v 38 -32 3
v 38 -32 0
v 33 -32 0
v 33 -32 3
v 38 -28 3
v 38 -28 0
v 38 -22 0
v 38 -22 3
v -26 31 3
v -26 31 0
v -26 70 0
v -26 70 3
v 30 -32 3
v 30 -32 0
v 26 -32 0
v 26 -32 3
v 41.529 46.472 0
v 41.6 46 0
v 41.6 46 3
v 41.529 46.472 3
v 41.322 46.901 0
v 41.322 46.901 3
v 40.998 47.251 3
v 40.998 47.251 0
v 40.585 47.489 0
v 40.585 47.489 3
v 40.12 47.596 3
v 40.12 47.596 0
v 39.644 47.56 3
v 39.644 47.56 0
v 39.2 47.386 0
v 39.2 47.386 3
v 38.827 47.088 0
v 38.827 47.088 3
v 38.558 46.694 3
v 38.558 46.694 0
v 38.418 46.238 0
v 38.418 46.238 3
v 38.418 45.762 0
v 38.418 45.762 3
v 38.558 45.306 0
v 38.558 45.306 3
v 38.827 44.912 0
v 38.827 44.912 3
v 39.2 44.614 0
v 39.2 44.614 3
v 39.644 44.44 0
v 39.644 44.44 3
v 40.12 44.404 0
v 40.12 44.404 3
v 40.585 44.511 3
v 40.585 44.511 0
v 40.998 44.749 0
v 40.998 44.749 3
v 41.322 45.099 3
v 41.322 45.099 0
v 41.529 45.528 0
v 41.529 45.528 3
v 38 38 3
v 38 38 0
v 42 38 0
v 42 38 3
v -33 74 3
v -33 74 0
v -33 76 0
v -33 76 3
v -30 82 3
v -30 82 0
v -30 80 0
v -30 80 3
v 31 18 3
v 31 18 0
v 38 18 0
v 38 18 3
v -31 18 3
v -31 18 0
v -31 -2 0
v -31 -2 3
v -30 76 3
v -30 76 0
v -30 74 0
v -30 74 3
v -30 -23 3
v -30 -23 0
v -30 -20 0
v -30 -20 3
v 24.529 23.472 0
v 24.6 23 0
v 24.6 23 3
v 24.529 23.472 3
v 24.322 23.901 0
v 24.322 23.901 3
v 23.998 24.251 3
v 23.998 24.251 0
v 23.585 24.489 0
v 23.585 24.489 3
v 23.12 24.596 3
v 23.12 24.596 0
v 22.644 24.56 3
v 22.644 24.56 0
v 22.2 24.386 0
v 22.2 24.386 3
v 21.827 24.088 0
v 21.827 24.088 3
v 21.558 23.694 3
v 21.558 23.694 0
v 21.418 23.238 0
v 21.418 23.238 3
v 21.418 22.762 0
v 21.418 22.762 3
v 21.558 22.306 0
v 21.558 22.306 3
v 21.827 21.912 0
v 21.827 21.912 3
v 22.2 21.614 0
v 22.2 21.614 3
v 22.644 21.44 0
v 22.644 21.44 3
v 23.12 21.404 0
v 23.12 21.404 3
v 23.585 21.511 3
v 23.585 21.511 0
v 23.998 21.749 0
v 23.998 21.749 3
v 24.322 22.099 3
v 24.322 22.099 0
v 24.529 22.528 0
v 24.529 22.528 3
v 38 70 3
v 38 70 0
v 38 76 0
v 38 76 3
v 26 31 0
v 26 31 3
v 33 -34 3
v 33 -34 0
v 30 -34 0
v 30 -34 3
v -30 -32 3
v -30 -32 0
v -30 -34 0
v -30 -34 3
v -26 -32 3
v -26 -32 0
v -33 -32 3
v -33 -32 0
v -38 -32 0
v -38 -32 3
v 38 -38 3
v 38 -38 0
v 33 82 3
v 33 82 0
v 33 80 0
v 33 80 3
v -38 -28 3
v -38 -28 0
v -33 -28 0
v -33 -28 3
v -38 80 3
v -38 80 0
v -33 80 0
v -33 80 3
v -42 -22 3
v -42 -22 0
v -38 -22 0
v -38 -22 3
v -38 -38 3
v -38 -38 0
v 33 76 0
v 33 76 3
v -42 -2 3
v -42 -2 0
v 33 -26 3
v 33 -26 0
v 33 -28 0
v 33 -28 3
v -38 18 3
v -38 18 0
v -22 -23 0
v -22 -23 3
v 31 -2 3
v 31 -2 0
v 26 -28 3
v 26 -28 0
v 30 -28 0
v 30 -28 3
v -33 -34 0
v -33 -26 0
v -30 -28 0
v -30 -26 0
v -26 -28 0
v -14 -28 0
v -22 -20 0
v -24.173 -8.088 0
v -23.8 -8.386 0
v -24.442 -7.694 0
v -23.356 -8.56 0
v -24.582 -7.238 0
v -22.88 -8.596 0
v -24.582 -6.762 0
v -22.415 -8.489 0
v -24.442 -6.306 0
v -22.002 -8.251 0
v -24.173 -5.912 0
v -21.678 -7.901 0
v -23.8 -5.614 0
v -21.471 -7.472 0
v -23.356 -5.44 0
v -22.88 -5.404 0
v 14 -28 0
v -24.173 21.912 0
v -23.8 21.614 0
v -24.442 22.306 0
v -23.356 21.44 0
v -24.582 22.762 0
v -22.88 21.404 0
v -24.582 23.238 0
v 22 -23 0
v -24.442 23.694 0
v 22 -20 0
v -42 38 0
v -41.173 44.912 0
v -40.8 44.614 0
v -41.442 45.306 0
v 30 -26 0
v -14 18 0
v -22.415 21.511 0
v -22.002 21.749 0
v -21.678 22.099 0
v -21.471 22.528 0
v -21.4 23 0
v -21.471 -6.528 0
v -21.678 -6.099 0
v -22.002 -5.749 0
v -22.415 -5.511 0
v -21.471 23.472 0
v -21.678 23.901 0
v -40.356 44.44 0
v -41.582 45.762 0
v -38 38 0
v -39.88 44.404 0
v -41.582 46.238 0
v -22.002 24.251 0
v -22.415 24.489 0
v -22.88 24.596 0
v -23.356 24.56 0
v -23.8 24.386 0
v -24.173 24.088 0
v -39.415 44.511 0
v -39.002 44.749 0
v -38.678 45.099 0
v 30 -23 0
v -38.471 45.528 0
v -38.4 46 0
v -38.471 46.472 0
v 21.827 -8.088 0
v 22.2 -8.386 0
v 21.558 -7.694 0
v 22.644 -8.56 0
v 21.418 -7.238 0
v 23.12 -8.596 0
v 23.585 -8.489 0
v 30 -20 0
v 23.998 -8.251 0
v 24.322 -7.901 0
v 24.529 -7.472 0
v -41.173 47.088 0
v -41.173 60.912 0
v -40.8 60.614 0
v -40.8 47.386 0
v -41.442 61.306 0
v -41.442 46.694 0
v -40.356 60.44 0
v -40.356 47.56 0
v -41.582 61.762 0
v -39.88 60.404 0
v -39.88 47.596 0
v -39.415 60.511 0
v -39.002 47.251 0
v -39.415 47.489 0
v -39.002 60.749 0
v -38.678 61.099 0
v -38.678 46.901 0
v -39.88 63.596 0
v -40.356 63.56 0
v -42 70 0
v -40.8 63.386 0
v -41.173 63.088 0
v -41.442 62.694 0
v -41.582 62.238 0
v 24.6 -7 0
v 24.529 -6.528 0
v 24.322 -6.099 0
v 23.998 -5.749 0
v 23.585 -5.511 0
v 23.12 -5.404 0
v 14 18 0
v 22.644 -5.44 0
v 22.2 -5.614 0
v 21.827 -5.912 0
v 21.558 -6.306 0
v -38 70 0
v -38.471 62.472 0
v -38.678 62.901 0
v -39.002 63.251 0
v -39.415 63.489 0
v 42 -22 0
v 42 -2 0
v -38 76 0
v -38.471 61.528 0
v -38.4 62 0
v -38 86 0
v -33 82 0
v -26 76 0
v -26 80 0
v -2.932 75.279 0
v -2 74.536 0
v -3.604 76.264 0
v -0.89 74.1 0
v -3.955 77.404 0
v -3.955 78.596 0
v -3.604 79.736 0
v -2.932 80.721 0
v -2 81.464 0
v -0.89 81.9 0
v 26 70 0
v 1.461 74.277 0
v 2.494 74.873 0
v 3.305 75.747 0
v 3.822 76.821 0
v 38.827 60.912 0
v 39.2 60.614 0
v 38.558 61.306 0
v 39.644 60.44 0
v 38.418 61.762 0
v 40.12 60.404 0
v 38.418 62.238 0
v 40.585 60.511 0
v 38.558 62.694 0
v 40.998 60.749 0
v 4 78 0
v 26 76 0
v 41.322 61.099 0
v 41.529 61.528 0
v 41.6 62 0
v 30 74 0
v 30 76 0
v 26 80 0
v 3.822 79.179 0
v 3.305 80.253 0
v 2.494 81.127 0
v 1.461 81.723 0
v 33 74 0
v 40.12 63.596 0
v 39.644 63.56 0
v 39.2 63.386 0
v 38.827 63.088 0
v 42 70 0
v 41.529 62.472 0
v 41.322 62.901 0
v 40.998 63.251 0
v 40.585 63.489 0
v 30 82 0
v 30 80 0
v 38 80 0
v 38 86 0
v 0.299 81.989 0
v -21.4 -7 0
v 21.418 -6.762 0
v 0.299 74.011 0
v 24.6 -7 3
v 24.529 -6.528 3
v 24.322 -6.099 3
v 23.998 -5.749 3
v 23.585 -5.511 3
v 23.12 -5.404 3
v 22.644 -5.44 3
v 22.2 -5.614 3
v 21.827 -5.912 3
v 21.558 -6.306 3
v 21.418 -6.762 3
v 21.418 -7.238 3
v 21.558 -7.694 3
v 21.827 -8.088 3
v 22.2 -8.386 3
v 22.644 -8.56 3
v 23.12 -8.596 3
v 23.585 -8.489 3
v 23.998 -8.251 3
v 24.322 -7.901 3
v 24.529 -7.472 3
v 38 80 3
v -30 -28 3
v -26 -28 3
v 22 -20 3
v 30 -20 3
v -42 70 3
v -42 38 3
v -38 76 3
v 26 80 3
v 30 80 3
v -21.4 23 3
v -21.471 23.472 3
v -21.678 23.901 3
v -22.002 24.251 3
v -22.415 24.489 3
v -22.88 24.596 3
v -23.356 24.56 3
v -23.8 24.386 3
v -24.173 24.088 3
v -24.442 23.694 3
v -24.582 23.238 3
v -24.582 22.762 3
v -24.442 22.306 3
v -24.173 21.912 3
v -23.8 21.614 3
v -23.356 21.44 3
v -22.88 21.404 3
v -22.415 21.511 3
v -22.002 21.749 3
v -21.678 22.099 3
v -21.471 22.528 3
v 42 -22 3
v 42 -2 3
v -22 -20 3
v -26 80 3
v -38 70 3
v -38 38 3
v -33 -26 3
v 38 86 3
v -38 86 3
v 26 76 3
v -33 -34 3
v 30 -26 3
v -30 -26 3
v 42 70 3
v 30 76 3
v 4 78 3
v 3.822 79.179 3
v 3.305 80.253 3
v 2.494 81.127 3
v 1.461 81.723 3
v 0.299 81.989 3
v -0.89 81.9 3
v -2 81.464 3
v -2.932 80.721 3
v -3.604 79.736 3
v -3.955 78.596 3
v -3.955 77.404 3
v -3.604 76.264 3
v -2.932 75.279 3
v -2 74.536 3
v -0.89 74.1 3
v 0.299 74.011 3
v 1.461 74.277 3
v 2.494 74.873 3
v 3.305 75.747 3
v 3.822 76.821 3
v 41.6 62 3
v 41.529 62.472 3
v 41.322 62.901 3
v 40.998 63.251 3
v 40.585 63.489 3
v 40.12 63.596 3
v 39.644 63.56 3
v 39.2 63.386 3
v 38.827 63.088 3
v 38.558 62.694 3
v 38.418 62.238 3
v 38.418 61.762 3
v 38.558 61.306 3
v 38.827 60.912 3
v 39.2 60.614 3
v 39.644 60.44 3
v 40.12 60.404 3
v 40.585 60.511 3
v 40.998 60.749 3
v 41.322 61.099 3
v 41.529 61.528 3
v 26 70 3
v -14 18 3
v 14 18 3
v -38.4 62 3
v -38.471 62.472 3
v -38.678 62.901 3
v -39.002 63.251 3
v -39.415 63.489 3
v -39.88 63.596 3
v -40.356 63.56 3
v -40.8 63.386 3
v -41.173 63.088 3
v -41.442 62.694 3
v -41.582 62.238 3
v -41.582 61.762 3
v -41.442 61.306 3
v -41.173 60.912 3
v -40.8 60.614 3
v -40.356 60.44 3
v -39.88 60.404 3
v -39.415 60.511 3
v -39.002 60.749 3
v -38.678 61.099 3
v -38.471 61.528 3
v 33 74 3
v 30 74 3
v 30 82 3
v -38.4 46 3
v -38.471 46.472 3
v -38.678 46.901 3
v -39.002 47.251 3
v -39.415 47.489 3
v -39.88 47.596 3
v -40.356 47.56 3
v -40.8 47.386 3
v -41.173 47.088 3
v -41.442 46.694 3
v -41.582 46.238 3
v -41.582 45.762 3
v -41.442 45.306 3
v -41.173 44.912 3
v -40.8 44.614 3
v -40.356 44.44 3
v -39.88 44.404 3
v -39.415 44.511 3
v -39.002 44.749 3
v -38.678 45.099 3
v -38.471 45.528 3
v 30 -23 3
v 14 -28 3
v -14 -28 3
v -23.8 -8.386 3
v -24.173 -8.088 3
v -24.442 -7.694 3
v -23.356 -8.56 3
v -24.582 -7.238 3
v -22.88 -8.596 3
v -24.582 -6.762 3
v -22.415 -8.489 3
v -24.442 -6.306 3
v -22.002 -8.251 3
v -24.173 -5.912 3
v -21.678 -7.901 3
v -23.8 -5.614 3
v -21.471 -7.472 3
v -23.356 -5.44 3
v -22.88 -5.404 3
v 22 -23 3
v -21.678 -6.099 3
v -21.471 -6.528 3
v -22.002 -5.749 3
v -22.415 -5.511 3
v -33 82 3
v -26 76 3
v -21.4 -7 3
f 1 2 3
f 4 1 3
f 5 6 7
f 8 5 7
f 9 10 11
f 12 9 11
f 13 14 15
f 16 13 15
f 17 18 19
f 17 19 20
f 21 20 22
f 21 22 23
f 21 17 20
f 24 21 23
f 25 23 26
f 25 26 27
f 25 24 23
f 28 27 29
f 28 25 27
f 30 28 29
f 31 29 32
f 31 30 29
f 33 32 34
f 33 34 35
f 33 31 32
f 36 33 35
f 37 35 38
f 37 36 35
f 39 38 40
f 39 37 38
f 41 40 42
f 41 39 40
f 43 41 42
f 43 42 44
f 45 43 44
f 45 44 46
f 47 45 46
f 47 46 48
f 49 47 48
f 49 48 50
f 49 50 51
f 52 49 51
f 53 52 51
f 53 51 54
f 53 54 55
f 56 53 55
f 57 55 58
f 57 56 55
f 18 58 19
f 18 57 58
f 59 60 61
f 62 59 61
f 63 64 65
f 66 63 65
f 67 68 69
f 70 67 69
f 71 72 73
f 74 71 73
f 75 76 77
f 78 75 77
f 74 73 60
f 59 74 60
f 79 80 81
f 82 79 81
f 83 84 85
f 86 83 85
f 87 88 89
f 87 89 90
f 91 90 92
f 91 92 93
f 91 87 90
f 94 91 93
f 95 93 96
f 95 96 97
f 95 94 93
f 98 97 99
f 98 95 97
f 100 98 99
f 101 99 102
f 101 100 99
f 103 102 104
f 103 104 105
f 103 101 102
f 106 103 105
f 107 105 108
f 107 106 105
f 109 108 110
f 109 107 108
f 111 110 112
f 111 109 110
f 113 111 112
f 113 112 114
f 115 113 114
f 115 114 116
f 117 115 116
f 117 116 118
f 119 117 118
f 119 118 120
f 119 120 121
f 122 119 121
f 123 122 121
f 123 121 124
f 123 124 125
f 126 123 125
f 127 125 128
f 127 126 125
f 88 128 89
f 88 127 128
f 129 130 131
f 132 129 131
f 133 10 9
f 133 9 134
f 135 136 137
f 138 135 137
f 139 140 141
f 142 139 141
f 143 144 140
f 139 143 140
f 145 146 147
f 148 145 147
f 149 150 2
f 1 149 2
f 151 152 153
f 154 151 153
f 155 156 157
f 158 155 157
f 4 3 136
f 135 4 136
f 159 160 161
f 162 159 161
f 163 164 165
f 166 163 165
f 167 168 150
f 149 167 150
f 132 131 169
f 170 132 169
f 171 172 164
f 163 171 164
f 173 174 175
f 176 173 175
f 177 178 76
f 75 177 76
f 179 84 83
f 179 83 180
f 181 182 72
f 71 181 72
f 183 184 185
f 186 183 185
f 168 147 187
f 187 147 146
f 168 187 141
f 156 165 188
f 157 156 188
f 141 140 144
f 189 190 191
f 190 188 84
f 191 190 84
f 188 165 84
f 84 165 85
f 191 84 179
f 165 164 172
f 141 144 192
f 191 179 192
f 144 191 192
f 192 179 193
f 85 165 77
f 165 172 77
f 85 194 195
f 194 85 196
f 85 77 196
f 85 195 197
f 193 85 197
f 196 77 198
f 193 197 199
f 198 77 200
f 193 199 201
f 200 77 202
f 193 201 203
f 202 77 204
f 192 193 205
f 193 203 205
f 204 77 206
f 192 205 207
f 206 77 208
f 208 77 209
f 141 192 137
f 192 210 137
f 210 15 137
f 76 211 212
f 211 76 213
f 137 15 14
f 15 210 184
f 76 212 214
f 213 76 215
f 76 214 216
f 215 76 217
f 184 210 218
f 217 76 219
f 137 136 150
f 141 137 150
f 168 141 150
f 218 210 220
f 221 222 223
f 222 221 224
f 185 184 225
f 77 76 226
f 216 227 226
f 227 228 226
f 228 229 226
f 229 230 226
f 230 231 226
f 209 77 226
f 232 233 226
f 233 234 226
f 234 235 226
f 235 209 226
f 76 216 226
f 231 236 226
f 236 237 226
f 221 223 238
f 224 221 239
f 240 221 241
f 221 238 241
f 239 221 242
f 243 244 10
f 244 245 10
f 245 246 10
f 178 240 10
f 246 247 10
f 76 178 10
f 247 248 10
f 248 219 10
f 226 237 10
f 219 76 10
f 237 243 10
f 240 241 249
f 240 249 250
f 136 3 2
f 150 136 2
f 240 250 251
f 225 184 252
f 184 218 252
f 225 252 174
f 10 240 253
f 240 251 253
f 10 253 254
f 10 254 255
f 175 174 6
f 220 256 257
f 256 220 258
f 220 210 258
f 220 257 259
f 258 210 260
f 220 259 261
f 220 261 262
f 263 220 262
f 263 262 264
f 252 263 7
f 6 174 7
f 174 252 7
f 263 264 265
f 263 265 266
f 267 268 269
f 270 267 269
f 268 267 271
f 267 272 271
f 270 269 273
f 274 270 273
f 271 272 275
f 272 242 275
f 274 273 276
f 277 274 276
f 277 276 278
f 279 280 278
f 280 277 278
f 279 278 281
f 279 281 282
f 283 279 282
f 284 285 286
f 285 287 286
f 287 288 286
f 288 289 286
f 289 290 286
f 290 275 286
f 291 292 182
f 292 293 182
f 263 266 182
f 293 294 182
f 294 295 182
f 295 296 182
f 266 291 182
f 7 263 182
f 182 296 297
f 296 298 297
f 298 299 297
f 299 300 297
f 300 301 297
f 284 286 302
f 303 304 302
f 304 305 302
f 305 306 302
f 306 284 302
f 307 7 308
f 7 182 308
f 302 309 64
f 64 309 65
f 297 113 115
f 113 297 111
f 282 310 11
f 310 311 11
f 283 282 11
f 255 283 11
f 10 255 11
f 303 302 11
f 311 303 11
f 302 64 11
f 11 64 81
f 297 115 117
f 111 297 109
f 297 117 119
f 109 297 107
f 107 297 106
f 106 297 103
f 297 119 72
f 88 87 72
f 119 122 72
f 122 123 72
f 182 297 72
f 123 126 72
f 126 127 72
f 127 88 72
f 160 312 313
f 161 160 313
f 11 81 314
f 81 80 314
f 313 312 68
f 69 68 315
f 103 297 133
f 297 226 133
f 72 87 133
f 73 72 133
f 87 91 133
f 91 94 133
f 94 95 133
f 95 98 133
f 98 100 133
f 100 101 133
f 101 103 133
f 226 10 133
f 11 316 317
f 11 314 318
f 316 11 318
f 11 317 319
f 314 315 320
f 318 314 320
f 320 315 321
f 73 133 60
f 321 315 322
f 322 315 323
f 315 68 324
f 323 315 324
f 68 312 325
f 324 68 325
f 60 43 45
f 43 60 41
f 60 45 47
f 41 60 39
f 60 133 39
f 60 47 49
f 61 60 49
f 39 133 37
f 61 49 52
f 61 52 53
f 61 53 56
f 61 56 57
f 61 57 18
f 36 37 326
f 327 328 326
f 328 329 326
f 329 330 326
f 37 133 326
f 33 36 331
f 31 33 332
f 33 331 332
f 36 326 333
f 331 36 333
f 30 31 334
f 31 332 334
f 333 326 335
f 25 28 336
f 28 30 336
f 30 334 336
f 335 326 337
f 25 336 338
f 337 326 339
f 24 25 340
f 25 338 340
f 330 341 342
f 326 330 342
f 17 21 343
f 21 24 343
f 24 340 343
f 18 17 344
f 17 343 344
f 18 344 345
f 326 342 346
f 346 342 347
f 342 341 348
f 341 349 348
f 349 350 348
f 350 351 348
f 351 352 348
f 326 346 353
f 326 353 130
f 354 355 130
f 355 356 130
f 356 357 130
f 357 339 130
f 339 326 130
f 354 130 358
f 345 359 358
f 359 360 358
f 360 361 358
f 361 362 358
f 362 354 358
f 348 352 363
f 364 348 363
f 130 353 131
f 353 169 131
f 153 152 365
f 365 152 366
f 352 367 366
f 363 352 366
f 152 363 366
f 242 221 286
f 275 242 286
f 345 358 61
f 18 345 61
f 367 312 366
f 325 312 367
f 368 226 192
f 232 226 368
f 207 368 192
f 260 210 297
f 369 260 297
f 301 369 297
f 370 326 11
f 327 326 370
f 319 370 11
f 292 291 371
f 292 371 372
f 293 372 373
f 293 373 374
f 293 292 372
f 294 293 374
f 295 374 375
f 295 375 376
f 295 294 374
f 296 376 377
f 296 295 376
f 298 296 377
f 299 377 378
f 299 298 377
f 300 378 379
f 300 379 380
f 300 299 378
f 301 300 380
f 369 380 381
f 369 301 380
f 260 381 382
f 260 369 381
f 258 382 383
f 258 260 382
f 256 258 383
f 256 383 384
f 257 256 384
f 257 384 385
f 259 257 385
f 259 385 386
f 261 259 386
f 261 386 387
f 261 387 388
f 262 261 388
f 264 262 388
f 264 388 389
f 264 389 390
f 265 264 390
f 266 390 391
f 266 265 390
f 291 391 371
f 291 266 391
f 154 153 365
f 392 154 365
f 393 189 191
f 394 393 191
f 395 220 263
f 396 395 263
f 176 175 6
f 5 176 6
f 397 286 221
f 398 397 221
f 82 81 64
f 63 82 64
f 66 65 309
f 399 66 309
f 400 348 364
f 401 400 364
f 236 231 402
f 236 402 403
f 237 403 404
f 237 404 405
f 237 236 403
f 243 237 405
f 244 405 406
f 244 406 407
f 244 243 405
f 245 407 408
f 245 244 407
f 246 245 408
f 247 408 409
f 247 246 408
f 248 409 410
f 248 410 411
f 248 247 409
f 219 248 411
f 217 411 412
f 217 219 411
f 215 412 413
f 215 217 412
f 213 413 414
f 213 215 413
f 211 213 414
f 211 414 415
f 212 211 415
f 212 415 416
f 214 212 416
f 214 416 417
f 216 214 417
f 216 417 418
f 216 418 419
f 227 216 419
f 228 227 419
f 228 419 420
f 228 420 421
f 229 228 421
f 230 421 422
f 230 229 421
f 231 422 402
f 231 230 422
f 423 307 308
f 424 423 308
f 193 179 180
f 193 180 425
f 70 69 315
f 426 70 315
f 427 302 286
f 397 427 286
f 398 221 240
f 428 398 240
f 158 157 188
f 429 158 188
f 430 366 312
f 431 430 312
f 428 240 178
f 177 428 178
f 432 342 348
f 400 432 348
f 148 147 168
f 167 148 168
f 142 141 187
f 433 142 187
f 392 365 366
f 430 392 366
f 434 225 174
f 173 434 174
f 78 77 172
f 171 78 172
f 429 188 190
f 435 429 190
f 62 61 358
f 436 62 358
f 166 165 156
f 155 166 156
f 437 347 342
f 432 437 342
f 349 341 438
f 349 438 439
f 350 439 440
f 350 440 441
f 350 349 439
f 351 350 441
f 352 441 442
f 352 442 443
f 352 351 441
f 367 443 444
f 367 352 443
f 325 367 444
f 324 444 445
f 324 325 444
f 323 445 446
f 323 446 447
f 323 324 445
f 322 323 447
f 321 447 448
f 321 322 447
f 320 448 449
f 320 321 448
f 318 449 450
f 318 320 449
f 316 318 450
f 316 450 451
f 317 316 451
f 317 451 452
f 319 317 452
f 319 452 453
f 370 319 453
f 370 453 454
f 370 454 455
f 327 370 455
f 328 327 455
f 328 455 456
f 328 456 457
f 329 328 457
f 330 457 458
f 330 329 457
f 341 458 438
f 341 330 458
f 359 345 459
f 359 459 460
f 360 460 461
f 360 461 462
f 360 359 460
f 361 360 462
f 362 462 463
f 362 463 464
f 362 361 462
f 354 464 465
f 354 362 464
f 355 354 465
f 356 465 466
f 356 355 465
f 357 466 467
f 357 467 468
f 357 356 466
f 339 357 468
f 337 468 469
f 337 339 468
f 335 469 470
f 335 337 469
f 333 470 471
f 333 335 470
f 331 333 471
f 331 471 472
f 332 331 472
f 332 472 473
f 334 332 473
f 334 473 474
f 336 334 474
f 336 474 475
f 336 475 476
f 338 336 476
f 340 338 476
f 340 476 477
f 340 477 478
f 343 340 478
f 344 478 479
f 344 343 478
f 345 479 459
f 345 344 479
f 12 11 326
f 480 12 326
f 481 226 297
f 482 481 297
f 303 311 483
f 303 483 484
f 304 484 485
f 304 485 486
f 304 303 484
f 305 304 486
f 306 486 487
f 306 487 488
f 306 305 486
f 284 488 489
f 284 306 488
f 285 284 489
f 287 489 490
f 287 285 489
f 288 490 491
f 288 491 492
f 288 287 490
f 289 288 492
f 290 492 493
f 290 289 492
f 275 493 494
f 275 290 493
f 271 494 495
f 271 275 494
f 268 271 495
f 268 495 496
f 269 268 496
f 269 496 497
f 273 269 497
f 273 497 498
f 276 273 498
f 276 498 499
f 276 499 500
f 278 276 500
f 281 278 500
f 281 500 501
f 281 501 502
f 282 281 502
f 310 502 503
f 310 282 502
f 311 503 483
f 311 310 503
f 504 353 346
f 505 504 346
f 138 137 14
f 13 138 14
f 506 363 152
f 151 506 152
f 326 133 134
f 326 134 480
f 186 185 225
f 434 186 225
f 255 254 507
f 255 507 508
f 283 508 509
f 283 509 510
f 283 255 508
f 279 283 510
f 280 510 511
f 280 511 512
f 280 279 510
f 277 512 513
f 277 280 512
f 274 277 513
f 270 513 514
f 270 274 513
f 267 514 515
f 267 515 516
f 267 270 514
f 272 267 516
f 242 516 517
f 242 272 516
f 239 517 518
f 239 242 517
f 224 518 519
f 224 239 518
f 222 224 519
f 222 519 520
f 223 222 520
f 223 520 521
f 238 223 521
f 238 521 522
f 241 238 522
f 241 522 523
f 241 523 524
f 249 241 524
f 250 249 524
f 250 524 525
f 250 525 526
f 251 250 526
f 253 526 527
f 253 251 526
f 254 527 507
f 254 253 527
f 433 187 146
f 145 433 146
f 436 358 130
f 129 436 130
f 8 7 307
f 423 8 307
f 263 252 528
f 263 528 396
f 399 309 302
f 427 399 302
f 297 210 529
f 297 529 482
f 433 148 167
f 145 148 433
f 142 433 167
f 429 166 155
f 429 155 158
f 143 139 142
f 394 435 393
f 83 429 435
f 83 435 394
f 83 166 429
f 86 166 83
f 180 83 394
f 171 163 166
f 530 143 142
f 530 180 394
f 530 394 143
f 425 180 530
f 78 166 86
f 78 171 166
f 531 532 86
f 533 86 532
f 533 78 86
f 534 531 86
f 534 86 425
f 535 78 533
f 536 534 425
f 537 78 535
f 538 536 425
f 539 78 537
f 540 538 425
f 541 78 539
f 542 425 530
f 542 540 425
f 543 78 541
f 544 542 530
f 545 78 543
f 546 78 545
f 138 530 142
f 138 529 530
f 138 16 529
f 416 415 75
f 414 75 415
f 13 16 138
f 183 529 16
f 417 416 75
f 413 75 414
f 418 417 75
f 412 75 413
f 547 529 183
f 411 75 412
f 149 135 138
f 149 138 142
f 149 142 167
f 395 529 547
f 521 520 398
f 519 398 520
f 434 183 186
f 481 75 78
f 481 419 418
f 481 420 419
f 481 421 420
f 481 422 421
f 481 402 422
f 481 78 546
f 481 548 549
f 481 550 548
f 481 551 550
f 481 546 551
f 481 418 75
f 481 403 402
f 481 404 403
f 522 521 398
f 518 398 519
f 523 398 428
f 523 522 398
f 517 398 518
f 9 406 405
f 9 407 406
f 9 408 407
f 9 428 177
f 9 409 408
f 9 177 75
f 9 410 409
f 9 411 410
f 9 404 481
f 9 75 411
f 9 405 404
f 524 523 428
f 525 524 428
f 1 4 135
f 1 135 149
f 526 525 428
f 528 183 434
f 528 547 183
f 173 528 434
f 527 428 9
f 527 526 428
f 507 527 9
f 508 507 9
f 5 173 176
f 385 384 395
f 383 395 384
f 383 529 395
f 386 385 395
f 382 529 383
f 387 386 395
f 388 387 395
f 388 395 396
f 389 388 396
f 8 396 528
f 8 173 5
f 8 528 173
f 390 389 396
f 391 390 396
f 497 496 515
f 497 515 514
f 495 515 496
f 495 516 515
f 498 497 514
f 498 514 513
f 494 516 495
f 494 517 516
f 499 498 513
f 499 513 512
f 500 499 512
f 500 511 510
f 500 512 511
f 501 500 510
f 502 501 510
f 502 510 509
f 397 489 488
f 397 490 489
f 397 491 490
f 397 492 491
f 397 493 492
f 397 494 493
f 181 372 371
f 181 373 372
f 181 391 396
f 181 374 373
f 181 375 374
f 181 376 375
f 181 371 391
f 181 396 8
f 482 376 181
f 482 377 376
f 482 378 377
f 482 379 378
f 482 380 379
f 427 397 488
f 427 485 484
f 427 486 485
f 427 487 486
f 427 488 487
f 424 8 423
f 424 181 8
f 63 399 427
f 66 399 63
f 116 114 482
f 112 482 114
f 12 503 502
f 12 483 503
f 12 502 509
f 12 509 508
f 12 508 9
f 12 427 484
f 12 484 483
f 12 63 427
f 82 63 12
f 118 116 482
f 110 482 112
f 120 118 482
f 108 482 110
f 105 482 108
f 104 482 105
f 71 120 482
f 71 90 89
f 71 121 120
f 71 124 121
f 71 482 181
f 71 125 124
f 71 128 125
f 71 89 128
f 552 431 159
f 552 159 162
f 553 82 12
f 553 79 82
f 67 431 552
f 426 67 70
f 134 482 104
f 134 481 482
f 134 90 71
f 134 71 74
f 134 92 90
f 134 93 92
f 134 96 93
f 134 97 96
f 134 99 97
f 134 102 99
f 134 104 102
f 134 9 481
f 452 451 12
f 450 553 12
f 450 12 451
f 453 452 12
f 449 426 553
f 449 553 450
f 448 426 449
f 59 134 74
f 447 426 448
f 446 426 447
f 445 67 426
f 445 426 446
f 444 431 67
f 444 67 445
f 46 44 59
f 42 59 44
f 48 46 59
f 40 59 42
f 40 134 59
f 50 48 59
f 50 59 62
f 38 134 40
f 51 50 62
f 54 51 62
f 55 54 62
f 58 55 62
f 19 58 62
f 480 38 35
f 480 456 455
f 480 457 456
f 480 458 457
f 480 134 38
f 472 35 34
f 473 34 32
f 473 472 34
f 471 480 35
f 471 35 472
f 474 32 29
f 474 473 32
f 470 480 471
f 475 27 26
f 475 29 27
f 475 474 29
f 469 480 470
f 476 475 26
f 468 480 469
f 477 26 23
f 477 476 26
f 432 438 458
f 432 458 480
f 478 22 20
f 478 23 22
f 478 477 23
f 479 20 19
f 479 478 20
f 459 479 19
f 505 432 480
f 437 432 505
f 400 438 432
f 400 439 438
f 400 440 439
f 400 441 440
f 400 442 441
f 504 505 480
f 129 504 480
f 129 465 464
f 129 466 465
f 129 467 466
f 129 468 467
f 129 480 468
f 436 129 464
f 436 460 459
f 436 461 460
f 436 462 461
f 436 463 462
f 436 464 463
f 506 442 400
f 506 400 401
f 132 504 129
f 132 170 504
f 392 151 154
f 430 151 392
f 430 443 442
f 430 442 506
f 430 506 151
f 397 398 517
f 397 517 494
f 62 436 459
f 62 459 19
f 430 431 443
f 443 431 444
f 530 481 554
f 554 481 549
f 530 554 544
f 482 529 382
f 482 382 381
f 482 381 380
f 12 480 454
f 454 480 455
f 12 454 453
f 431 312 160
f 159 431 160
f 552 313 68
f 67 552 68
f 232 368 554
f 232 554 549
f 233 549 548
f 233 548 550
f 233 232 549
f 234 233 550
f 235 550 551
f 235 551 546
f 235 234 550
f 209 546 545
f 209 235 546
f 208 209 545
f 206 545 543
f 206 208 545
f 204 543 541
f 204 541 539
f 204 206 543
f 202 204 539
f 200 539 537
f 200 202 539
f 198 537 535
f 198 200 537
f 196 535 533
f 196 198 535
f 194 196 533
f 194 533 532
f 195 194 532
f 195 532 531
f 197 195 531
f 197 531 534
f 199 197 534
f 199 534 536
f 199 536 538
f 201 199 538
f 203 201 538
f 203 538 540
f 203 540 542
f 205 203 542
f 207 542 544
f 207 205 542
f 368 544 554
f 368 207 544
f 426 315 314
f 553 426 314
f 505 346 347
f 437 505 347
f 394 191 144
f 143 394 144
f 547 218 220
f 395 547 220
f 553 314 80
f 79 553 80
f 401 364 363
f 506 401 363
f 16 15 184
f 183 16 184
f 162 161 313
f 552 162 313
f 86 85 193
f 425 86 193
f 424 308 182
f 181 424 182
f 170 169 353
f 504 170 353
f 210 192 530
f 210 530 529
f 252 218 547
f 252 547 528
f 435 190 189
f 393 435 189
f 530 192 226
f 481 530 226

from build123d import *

# Parameters (mm, degrees)
SKETCH_1_W      = 8
SKETCH_1_H      = 3
SKETCH_1_R      = 1.6
SKETCH_1_W_2    = 28
SKETCH_1_H_2    = 46
SKETCH_1_W_3    = 52
SKETCH_1_H_3    = 39
SKETCH_1_R_2    = 4
EXTRUDE_1_DEPTH = 3


with BuildPart() as part:
    # 草图1 → 凸台-拉伸1 (new body)
    with BuildSketch(Plane.XY):
        Polygon((-42, 70), (-42, 54), (-42, 38), (-38, 38), (-38, 18), (-31, 18), (-31, -2), (-38, -2), (-42, -2), (-42, -22), (-38, -22), (-38, -28), (-33, -28), (-33, -26), (-30, -26), (-30, -28), (-26, -28), (-26, -32), (-30, -32), (-30, -34), (-33, -34), (-33, -32), (-38, -32), (-38, -38), (38, -38), (38, -32), (33, -32), (33, -34), (30, -34), (30, -32), (26, -32), (26, -28), (30, -28), (30, -26), (33, -26), (33, -28), (38, -28), (38, -22), (42, -22), (42, -2), (38, -2), (31, -2), (31, 18), (38, 18), (38, 38), (42, 38), (42, 54), (42, 70), (38, 70), (38, 76), (33, 76), (33, 74), (30, 74), (30, 76), (26, 76), (26, 80), (30, 80), (30, 82), (33, 82), (33, 80), (38, 80), (38, 86), (-38, 86), (-38, 80), (-33, 80), (-33, 82), (-30, 82), (-30, 80), (-26, 80), (-26, 76), (-30, 76), (-30, 74), (-33, 74), (-33, 76), (-38, 76), (-38, 70), align=None)
        with Locations((-26, -21.5)):
            Rectangle(SKETCH_1_W, SKETCH_1_H, mode=Mode.SUBTRACT)
        with Locations((-23, -7)):
            Circle(SKETCH_1_R, mode=Mode.SUBTRACT)
        with Locations((-23, 23)):
            Circle(SKETCH_1_R, mode=Mode.SUBTRACT)
        with Locations((26, -21.5)):
            Rectangle(SKETCH_1_W, SKETCH_1_H, mode=Mode.SUBTRACT)
        with Locations((0, -5)):
            Rectangle(SKETCH_1_W_2, SKETCH_1_H_2, mode=Mode.SUBTRACT)
        with Locations((23, -7)):
            Circle(SKETCH_1_R, mode=Mode.SUBTRACT)
        with Locations((23, 23)):
            Circle(SKETCH_1_R, mode=Mode.SUBTRACT)
        with Locations((-40, 46)):
            Circle(SKETCH_1_R, mode=Mode.SUBTRACT)
        with Locations((0, 50.5)):
            Rectangle(SKETCH_1_W_3, SKETCH_1_H_3, mode=Mode.SUBTRACT)
        with Locations((-40, 62)):
            Circle(SKETCH_1_R, mode=Mode.SUBTRACT)
        with Locations((40, 46)):
            Circle(SKETCH_1_R, mode=Mode.SUBTRACT)
        with Locations((0, 78)):
            Circle(SKETCH_1_R_2, mode=Mode.SUBTRACT)
        with Locations((40, 62)):
            Circle(SKETCH_1_R, mode=Mode.SUBTRACT)
    extrude(amount=EXTRUDE_1_DEPTH)


solid = part.part
